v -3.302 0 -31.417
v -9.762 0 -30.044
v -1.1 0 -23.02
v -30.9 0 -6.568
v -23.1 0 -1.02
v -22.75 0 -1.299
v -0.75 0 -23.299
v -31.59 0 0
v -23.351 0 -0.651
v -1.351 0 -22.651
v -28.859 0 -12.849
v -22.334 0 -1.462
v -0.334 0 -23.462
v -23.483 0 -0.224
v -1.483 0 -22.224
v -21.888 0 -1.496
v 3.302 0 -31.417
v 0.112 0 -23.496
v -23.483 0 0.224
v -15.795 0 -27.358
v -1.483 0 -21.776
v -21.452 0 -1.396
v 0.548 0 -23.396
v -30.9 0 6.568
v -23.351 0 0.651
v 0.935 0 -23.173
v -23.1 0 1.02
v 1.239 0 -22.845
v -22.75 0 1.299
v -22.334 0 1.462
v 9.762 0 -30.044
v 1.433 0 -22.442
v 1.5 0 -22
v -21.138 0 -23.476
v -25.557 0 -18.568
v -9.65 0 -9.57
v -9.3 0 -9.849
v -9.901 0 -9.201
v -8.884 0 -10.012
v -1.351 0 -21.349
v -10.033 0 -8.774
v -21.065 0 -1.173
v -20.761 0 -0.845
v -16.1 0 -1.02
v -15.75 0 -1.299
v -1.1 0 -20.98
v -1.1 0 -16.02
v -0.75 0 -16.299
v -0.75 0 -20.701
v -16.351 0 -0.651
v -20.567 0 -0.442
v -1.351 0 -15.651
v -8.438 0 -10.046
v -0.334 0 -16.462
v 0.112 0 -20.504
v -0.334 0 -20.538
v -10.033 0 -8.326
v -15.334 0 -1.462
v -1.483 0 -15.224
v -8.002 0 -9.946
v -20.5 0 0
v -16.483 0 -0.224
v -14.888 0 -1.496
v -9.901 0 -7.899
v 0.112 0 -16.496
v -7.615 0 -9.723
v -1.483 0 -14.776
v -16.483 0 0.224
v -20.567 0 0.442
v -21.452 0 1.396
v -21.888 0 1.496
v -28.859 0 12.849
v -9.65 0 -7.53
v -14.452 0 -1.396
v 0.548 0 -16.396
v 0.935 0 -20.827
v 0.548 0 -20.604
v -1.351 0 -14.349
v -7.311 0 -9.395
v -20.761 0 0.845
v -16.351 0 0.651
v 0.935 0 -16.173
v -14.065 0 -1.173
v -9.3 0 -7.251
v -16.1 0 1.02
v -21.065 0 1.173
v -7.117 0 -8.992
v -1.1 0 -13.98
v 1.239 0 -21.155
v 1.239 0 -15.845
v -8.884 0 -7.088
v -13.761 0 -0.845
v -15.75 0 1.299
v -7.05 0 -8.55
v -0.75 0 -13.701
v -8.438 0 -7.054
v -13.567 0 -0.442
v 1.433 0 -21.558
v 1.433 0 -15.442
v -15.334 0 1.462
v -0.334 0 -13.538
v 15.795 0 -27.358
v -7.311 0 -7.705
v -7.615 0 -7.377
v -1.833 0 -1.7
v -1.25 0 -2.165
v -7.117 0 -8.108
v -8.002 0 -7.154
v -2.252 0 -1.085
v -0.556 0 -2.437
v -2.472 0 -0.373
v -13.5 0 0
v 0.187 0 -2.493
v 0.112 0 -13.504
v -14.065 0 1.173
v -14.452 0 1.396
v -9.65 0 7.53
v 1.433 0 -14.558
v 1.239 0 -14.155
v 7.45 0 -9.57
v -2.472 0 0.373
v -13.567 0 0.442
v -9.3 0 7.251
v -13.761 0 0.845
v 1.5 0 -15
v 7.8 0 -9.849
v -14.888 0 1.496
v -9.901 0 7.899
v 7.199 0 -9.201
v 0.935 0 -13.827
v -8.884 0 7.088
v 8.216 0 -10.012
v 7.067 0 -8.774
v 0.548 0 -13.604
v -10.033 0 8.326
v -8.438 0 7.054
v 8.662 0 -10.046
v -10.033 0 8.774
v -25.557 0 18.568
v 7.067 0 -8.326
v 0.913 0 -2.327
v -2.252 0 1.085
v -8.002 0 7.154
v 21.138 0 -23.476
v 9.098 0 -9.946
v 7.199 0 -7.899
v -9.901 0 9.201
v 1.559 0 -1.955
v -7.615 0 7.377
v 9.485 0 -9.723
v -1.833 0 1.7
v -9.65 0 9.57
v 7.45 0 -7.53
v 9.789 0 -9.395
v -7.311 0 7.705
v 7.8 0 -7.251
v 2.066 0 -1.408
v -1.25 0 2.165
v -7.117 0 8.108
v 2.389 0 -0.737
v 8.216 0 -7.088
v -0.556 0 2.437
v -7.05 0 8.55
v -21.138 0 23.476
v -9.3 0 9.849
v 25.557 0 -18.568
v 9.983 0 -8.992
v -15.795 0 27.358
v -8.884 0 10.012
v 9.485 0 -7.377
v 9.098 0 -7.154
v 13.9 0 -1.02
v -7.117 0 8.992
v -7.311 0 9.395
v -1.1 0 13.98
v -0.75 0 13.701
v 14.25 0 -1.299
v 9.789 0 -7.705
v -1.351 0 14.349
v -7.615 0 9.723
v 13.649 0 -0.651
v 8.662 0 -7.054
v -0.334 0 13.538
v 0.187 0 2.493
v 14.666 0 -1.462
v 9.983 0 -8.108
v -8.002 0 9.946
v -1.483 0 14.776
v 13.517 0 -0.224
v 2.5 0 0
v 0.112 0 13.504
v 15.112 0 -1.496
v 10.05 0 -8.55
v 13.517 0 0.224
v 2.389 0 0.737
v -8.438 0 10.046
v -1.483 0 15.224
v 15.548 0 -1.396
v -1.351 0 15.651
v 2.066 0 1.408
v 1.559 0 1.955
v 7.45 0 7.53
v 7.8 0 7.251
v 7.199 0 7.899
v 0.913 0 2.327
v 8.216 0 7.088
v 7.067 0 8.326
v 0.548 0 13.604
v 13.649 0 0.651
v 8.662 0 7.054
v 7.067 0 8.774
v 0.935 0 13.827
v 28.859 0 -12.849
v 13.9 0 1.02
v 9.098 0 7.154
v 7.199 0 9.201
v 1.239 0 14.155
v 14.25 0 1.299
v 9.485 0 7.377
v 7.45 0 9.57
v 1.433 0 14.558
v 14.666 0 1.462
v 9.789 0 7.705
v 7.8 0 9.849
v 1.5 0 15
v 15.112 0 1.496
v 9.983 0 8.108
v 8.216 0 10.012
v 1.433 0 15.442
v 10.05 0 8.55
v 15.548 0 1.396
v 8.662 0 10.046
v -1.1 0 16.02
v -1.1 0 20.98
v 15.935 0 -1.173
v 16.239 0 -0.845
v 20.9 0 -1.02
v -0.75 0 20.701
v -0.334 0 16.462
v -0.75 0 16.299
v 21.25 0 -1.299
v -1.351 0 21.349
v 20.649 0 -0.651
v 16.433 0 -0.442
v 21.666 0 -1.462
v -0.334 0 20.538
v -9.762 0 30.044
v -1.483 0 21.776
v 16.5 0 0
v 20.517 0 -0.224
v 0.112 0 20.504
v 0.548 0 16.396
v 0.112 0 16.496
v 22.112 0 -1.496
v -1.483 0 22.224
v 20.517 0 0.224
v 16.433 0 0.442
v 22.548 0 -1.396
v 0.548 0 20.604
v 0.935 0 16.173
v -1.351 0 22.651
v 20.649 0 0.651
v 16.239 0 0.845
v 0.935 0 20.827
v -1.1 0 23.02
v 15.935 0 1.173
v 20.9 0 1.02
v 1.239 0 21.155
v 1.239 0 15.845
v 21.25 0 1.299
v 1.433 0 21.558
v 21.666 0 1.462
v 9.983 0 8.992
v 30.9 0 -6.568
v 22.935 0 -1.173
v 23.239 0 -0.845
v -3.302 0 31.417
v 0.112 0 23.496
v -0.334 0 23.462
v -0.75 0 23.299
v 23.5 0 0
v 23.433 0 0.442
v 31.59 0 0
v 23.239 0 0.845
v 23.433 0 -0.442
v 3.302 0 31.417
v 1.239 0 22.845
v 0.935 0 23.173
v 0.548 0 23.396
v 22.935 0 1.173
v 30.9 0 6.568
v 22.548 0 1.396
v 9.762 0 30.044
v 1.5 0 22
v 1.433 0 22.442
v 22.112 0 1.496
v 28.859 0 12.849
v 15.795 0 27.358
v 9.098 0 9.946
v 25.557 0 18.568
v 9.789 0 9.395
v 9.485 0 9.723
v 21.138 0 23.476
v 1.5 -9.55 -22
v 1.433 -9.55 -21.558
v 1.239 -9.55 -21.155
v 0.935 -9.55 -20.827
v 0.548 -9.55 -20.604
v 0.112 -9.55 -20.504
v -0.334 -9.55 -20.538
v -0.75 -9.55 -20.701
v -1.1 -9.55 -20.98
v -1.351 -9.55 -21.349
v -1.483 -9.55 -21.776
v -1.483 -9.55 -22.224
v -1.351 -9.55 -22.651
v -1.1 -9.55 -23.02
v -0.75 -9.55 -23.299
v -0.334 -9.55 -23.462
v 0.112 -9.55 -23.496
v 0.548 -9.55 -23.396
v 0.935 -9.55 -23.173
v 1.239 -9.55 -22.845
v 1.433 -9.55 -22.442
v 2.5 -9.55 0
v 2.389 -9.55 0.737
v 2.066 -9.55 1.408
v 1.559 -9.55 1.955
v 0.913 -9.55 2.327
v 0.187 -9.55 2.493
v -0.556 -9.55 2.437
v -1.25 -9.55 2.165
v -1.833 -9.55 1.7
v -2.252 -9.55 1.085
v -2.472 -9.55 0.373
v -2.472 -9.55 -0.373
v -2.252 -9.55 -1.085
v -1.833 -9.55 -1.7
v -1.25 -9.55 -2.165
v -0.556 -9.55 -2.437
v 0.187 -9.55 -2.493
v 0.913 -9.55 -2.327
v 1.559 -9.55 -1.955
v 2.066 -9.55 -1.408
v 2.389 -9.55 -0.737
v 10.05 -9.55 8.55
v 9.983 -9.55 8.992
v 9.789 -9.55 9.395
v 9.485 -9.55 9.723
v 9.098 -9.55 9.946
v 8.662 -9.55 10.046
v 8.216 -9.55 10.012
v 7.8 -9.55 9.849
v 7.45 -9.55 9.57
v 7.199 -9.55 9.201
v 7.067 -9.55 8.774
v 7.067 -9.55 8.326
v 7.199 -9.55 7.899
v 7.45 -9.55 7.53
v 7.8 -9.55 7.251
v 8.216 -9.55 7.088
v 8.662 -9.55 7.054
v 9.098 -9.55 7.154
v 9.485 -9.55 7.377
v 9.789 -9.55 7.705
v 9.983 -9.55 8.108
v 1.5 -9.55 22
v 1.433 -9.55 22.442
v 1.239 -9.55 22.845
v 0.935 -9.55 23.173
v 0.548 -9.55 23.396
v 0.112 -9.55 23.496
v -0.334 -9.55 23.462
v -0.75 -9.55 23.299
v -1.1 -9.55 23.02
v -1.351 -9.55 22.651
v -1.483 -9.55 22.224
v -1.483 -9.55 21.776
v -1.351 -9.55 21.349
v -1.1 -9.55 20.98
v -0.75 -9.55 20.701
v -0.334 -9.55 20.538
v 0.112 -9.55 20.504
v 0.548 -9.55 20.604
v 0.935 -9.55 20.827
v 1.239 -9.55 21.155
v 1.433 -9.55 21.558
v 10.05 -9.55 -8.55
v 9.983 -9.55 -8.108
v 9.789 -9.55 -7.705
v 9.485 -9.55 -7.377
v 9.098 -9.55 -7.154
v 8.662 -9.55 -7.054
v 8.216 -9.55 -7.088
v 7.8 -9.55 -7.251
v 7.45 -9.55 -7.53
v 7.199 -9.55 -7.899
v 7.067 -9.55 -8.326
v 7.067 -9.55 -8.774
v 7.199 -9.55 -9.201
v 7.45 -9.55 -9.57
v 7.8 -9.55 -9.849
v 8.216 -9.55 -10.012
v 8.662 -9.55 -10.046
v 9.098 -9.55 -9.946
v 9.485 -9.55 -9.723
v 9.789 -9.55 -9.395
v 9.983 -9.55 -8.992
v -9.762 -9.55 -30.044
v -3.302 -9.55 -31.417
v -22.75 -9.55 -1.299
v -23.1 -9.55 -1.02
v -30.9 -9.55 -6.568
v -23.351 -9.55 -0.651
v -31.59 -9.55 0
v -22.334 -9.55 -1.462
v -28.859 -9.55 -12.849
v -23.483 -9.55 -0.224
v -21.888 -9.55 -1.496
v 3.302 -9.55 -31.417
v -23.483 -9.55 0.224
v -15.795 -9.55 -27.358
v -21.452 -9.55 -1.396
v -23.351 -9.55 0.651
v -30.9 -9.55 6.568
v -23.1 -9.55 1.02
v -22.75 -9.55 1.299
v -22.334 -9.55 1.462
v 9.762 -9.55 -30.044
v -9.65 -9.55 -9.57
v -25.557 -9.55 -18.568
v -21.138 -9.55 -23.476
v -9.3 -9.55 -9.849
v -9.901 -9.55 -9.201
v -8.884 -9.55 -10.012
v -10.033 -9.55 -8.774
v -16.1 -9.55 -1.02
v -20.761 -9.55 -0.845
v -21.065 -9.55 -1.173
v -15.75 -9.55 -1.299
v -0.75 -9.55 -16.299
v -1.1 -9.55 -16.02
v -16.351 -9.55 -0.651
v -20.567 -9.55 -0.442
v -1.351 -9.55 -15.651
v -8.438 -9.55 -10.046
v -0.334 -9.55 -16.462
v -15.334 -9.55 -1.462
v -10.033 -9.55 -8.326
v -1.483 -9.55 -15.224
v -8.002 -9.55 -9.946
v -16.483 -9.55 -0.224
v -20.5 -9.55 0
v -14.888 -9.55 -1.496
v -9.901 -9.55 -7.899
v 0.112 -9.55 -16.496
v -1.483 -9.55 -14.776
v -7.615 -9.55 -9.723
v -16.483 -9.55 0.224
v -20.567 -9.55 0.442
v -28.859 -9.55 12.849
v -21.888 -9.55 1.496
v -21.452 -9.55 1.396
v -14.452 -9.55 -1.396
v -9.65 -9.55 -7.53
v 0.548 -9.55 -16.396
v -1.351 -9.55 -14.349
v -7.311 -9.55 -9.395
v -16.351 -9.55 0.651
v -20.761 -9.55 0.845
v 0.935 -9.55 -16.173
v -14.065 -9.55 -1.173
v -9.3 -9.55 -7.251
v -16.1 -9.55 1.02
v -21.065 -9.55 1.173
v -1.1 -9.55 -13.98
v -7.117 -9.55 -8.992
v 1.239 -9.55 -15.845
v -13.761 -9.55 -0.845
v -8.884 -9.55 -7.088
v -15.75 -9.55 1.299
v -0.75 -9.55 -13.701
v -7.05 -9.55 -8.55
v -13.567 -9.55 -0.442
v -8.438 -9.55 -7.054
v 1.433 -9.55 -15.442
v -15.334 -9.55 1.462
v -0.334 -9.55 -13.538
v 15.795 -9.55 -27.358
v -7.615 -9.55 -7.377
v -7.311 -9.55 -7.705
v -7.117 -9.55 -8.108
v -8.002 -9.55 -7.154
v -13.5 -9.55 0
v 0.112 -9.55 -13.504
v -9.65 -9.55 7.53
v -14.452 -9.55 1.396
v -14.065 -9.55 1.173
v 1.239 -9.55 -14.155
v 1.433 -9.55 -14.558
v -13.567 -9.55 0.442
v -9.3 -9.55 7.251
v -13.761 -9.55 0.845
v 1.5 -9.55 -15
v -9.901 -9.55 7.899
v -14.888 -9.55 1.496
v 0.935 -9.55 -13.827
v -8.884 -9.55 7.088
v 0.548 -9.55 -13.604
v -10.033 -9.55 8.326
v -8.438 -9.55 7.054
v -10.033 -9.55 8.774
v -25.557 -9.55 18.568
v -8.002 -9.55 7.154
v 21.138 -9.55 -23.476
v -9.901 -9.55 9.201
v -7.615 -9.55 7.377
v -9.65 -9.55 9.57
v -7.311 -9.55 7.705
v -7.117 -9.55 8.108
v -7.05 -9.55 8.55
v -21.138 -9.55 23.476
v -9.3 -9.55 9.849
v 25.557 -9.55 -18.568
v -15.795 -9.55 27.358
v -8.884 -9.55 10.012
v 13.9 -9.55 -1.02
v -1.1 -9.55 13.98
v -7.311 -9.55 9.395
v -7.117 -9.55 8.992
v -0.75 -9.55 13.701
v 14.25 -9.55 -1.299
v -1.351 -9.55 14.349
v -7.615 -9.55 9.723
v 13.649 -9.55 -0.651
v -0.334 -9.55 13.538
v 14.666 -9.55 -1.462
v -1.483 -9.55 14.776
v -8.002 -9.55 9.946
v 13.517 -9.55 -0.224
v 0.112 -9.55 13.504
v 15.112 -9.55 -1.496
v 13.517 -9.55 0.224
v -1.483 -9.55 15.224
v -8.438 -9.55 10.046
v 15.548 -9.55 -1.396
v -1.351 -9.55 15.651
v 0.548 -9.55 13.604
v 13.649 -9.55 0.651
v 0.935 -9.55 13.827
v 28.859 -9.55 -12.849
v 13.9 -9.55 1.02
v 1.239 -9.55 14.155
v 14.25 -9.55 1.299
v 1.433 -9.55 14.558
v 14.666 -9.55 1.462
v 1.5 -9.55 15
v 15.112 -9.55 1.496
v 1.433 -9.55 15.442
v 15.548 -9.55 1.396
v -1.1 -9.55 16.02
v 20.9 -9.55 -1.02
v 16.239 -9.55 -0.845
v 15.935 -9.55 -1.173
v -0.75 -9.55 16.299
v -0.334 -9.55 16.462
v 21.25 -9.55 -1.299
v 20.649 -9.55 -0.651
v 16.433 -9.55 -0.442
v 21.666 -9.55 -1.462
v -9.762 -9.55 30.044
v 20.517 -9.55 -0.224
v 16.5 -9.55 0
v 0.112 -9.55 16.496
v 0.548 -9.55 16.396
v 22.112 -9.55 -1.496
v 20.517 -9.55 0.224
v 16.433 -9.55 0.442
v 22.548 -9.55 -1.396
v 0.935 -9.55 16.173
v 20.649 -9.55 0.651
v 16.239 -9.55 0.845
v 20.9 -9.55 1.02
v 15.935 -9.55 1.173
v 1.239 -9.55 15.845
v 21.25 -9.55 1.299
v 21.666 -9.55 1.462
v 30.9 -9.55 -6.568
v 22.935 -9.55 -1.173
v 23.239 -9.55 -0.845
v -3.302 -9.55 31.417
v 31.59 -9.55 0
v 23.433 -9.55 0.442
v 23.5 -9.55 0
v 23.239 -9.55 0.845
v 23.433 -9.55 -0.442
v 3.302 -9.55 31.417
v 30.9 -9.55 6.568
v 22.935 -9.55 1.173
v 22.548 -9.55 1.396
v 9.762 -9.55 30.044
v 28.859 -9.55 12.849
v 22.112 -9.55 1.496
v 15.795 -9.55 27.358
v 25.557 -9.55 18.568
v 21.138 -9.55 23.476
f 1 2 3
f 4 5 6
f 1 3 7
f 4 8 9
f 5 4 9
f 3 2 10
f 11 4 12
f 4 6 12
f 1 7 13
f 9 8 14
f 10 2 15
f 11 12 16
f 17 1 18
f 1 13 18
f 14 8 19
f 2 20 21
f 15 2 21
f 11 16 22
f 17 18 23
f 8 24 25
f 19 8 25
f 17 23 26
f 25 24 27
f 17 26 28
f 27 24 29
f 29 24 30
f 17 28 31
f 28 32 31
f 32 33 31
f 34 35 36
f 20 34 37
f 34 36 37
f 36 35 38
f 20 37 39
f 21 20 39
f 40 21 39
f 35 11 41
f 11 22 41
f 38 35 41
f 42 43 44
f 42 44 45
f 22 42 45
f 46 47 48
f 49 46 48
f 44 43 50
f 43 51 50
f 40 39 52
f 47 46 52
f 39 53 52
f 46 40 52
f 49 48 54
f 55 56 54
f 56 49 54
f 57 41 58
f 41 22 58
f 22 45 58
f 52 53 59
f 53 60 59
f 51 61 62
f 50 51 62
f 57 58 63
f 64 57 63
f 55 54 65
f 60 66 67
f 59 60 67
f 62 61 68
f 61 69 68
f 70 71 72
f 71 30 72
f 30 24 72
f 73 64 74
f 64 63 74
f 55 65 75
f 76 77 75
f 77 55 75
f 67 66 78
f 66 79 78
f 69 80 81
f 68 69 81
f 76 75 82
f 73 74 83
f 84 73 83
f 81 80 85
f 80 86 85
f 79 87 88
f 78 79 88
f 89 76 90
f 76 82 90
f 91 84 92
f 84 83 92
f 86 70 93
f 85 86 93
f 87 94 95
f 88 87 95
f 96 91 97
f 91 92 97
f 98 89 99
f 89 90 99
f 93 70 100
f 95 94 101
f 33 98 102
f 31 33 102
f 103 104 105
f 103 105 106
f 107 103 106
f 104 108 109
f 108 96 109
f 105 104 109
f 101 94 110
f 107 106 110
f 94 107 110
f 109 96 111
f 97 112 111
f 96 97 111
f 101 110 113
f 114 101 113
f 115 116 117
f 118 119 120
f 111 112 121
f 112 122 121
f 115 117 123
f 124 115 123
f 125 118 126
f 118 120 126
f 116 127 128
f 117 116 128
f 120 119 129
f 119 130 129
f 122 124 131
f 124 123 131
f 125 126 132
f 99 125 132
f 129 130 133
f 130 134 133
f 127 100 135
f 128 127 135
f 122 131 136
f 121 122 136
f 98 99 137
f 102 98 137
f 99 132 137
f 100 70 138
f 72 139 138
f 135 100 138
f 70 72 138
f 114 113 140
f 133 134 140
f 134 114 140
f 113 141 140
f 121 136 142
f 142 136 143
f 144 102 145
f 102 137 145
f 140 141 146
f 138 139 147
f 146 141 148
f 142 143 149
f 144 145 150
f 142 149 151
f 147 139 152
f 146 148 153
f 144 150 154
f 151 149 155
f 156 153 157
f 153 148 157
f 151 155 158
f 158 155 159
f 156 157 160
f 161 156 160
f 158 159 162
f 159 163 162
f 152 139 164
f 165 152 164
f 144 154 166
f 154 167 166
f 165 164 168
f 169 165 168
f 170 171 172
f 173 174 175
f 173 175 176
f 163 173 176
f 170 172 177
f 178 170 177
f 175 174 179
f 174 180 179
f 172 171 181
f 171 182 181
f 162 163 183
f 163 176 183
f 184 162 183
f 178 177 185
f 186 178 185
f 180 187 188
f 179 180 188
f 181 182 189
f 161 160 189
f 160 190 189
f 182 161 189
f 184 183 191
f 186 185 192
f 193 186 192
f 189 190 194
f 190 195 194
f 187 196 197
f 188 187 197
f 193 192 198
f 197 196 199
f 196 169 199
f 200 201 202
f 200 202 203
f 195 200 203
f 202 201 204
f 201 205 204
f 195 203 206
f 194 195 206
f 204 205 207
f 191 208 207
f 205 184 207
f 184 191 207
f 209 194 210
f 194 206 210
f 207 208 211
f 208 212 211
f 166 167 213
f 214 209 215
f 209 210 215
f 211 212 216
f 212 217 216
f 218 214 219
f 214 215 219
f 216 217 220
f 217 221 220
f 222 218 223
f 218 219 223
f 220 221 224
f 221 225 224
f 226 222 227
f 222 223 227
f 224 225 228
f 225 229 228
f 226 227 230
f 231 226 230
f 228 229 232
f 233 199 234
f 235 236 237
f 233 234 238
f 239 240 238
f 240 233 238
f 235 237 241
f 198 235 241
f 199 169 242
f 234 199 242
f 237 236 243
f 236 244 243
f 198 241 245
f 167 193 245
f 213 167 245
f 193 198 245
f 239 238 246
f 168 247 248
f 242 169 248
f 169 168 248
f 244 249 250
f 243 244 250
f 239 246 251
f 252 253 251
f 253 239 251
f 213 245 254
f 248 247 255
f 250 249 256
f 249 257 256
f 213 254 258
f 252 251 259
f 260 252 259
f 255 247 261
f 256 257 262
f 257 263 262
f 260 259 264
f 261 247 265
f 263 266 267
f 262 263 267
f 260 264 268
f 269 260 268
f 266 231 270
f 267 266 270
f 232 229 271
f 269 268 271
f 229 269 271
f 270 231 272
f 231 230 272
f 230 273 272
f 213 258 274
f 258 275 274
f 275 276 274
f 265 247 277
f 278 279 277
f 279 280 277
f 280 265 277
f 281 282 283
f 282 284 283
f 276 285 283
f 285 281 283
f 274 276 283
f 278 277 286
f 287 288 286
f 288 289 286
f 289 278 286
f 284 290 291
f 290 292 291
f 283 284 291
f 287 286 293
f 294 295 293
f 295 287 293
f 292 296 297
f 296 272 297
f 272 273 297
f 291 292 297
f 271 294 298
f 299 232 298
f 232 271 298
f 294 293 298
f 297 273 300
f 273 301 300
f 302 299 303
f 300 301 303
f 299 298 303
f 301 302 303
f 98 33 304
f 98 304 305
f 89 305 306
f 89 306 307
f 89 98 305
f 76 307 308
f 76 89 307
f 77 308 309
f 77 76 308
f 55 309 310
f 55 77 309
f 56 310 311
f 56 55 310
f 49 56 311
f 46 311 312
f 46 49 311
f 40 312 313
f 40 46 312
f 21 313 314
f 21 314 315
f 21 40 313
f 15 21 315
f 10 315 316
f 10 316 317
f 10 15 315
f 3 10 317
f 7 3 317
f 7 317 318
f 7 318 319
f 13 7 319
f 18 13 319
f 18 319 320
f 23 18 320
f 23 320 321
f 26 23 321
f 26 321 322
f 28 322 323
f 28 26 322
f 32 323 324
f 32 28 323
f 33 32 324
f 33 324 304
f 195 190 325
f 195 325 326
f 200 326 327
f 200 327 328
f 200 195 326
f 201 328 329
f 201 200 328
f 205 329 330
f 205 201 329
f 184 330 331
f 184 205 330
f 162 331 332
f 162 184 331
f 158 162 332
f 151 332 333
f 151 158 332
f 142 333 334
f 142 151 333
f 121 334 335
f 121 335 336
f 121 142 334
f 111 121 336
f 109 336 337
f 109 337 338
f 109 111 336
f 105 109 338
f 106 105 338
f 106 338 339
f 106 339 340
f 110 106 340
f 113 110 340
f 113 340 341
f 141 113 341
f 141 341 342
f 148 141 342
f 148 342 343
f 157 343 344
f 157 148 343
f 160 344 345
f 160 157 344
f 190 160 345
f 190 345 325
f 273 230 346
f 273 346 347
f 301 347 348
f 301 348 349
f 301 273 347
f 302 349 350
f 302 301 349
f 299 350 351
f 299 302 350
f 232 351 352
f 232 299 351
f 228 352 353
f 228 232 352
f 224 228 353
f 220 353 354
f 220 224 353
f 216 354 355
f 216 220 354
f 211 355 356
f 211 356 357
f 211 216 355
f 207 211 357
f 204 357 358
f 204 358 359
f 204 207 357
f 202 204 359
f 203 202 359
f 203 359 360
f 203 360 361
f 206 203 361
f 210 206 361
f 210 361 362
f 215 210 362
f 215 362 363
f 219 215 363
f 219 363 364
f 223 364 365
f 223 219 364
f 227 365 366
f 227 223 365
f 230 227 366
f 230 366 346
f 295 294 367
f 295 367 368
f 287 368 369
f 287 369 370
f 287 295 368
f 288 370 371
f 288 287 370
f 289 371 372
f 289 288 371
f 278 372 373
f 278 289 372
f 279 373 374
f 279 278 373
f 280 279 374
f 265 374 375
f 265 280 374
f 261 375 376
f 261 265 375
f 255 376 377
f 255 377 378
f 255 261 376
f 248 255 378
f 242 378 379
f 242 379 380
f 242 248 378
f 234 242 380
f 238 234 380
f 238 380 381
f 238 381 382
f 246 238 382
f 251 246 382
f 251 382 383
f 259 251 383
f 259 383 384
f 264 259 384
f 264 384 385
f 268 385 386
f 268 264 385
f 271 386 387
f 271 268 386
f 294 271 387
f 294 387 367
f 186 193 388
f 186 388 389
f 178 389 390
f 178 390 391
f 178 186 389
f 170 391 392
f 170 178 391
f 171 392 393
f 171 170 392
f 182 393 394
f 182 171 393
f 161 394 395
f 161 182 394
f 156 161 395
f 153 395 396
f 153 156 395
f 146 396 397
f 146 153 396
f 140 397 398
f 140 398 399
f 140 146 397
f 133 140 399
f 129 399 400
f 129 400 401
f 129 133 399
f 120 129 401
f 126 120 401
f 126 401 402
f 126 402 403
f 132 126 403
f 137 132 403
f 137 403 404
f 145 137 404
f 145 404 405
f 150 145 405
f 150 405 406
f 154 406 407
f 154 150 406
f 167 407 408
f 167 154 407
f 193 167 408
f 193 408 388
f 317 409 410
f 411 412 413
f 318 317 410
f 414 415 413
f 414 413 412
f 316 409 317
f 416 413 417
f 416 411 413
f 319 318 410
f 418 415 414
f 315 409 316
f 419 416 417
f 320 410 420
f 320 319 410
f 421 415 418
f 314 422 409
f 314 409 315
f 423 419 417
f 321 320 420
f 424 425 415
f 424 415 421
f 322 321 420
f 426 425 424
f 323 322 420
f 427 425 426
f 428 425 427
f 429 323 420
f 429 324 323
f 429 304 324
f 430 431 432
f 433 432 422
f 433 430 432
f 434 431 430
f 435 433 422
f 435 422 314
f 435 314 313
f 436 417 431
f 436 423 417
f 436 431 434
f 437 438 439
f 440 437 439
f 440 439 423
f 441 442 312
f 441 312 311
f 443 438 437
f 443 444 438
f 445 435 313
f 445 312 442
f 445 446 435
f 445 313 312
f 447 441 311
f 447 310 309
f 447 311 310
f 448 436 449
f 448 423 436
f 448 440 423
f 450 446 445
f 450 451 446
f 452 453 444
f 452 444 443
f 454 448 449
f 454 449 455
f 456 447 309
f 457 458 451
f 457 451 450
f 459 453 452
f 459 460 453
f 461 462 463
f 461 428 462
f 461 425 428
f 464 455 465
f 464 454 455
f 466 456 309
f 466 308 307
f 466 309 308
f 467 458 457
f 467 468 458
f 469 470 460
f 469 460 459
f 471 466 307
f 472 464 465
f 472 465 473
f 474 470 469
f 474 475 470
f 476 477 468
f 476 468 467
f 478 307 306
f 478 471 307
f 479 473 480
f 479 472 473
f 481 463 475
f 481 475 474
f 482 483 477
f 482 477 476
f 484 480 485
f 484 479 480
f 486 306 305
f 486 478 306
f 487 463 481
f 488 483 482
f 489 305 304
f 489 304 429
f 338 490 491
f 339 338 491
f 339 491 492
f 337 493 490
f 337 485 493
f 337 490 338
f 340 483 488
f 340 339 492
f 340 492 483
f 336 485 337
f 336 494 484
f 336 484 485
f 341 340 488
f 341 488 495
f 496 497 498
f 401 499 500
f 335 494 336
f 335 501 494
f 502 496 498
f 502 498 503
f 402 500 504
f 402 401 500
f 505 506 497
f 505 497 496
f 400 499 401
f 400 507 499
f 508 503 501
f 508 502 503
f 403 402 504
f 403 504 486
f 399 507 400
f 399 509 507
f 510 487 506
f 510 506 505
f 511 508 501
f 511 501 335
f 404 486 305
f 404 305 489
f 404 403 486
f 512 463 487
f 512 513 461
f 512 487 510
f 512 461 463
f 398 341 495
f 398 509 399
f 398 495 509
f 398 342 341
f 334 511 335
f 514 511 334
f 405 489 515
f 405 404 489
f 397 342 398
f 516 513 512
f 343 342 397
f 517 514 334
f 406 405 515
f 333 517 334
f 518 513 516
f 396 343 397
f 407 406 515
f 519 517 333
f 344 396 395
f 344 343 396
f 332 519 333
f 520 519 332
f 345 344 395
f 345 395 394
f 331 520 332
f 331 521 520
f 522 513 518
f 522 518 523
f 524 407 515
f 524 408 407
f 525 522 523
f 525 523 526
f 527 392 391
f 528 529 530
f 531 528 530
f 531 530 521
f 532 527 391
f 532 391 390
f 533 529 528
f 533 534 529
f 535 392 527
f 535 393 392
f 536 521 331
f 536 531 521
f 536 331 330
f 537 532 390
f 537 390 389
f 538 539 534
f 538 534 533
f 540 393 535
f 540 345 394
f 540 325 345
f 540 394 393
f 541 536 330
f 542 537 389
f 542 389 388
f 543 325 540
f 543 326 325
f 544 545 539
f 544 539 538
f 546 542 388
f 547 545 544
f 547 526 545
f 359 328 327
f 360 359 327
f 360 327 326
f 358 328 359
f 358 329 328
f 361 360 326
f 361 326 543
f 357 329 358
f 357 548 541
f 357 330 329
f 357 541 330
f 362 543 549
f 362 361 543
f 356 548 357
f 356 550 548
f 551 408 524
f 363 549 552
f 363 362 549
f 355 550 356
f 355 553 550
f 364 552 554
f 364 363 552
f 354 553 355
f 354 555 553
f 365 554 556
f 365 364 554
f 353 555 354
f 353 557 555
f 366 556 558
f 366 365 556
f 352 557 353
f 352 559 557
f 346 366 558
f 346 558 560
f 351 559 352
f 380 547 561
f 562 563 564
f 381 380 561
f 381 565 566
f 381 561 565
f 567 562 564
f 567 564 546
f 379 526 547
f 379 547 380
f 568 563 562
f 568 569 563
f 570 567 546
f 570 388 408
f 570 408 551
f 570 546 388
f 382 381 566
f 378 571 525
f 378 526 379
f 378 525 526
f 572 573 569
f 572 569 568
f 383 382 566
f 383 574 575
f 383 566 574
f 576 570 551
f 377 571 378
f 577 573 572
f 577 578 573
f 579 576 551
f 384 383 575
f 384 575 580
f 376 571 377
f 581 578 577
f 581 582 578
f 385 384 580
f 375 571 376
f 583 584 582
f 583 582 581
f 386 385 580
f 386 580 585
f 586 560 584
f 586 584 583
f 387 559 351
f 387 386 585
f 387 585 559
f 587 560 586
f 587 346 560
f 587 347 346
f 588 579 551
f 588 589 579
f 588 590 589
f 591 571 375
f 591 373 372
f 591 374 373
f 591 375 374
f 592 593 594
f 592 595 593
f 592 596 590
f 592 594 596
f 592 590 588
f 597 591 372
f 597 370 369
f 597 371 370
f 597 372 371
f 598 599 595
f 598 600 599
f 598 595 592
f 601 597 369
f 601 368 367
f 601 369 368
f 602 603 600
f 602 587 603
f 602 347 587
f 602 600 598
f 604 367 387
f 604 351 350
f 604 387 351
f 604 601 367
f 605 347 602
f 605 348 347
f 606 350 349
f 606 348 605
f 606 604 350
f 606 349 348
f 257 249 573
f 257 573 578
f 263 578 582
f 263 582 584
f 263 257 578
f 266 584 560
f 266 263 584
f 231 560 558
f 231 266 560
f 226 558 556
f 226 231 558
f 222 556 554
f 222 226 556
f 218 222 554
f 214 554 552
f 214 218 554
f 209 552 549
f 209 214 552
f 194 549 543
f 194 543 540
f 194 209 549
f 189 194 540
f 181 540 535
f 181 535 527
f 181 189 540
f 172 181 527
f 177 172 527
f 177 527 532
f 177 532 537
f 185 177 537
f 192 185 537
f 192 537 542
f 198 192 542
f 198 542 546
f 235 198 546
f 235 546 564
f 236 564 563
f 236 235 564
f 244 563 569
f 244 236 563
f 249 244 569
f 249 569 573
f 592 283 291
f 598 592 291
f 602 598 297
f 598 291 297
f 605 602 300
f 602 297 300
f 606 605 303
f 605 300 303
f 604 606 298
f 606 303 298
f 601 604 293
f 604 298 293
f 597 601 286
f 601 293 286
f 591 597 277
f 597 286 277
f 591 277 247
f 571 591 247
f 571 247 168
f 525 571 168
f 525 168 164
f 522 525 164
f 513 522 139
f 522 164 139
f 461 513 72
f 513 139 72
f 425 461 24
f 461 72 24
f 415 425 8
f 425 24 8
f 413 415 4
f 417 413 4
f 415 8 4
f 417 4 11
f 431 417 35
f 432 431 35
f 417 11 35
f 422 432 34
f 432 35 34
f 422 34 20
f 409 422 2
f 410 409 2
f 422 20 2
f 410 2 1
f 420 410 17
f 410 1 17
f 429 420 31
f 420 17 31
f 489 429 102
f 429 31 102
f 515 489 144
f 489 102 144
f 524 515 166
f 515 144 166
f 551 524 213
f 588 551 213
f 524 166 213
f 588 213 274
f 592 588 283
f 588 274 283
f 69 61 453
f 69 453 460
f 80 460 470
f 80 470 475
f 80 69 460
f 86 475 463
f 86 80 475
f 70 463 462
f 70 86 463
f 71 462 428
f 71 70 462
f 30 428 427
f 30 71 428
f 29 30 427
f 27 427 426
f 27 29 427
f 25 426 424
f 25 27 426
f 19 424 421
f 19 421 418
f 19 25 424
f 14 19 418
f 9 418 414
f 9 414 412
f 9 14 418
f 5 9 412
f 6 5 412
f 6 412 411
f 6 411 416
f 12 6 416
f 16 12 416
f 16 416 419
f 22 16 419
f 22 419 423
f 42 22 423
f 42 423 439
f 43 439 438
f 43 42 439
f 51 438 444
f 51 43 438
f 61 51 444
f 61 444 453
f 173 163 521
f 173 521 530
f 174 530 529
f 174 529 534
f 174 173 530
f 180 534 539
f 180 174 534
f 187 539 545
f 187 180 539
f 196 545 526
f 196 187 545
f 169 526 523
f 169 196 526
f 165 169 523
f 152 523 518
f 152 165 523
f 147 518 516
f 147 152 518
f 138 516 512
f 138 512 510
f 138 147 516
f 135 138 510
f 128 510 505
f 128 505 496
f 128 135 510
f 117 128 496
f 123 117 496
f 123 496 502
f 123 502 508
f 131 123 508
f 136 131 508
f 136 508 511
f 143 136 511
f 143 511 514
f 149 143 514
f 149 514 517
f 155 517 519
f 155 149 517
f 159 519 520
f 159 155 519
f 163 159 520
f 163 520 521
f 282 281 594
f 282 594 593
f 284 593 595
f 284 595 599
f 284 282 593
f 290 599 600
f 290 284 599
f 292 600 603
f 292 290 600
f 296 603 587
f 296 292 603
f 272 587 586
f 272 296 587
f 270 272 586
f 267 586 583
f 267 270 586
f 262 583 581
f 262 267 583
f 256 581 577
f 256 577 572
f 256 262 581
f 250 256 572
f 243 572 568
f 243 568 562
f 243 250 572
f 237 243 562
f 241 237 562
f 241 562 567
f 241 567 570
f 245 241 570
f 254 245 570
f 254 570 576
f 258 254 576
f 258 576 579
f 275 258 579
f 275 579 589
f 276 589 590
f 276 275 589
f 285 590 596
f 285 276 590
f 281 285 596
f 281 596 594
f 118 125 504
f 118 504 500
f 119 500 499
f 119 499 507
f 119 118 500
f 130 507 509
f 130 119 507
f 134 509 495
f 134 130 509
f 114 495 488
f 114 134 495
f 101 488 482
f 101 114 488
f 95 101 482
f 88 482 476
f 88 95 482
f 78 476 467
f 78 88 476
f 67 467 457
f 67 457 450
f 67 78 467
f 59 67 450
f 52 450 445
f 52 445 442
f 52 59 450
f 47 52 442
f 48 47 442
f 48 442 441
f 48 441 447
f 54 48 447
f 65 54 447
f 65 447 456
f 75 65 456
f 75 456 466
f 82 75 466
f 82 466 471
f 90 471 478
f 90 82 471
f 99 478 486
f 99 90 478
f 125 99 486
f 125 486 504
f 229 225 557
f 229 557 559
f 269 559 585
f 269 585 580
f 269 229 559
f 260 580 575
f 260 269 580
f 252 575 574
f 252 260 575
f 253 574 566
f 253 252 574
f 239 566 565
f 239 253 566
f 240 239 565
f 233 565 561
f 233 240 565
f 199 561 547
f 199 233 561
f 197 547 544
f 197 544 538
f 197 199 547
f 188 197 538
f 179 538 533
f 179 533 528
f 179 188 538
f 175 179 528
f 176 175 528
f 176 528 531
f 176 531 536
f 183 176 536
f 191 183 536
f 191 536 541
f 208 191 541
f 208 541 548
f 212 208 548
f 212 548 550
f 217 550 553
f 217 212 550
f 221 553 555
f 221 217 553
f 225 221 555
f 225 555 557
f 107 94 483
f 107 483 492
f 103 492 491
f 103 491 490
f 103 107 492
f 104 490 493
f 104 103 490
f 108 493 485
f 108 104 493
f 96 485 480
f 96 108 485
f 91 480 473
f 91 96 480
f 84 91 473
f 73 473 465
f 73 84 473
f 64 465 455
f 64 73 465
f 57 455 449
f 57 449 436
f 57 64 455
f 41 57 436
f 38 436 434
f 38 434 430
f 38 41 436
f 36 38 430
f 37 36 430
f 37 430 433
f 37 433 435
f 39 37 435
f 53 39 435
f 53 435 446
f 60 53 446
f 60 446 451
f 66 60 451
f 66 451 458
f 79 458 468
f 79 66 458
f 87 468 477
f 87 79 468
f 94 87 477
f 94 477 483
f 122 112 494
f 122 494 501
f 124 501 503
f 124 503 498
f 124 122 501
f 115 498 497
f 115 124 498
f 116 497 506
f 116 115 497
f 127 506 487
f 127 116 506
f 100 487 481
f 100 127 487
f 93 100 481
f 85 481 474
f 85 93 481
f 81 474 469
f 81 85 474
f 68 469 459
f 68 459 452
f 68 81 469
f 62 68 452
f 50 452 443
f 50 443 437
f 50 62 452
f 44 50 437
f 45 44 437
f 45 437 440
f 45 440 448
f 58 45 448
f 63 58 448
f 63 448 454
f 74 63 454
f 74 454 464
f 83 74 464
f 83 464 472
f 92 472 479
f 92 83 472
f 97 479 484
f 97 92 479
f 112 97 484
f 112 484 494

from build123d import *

# Parameters (mm, degrees)
F0_R     = 31.59
F0_R_2   = 1.5
F0_R_3   = 2.5
F1_DEPTH = 9.55


with BuildPart() as f1:
    # F0 (on Front) → F1 (new body)
    with BuildSketch(Plane.XZ):
        Circle(F0_R)
        with Locations((-8.55, -8.55)):
            Circle(F0_R_2, mode=Mode.SUBTRACT)
        with Locations((0, -22)):
            Circle(F0_R_2, mode=Mode.SUBTRACT)
        with Locations((0, -15)):
            Circle(F0_R_2, mode=Mode.SUBTRACT)
        with Locations((8.55, -8.55)):
            Circle(F0_R_2, mode=Mode.SUBTRACT)
        with Locations((-22, 0)):
            Circle(F0_R_2, mode=Mode.SUBTRACT)
        with Locations((-15, 0)):
            Circle(F0_R_2, mode=Mode.SUBTRACT)
        with Locations((-8.55, 8.55)):
            Circle(F0_R_2, mode=Mode.SUBTRACT)
        Circle(F0_R_3, mode=Mode.SUBTRACT)
        with Locations((15, 0)):
            Circle(F0_R_2, mode=Mode.SUBTRACT)
        with Locations((0, 15)):
            Circle(F0_R_2, mode=Mode.SUBTRACT)
        with Locations((8.55, 8.55)):
            Circle(F0_R_2, mode=Mode.SUBTRACT)
        with Locations((22, 0)):
            Circle(F0_R_2, mode=Mode.SUBTRACT)
        with Locations((0, 22)):
            Circle(F0_R_2, mode=Mode.SUBTRACT)
    extrude(amount=F1_DEPTH)


solid = f1.part
